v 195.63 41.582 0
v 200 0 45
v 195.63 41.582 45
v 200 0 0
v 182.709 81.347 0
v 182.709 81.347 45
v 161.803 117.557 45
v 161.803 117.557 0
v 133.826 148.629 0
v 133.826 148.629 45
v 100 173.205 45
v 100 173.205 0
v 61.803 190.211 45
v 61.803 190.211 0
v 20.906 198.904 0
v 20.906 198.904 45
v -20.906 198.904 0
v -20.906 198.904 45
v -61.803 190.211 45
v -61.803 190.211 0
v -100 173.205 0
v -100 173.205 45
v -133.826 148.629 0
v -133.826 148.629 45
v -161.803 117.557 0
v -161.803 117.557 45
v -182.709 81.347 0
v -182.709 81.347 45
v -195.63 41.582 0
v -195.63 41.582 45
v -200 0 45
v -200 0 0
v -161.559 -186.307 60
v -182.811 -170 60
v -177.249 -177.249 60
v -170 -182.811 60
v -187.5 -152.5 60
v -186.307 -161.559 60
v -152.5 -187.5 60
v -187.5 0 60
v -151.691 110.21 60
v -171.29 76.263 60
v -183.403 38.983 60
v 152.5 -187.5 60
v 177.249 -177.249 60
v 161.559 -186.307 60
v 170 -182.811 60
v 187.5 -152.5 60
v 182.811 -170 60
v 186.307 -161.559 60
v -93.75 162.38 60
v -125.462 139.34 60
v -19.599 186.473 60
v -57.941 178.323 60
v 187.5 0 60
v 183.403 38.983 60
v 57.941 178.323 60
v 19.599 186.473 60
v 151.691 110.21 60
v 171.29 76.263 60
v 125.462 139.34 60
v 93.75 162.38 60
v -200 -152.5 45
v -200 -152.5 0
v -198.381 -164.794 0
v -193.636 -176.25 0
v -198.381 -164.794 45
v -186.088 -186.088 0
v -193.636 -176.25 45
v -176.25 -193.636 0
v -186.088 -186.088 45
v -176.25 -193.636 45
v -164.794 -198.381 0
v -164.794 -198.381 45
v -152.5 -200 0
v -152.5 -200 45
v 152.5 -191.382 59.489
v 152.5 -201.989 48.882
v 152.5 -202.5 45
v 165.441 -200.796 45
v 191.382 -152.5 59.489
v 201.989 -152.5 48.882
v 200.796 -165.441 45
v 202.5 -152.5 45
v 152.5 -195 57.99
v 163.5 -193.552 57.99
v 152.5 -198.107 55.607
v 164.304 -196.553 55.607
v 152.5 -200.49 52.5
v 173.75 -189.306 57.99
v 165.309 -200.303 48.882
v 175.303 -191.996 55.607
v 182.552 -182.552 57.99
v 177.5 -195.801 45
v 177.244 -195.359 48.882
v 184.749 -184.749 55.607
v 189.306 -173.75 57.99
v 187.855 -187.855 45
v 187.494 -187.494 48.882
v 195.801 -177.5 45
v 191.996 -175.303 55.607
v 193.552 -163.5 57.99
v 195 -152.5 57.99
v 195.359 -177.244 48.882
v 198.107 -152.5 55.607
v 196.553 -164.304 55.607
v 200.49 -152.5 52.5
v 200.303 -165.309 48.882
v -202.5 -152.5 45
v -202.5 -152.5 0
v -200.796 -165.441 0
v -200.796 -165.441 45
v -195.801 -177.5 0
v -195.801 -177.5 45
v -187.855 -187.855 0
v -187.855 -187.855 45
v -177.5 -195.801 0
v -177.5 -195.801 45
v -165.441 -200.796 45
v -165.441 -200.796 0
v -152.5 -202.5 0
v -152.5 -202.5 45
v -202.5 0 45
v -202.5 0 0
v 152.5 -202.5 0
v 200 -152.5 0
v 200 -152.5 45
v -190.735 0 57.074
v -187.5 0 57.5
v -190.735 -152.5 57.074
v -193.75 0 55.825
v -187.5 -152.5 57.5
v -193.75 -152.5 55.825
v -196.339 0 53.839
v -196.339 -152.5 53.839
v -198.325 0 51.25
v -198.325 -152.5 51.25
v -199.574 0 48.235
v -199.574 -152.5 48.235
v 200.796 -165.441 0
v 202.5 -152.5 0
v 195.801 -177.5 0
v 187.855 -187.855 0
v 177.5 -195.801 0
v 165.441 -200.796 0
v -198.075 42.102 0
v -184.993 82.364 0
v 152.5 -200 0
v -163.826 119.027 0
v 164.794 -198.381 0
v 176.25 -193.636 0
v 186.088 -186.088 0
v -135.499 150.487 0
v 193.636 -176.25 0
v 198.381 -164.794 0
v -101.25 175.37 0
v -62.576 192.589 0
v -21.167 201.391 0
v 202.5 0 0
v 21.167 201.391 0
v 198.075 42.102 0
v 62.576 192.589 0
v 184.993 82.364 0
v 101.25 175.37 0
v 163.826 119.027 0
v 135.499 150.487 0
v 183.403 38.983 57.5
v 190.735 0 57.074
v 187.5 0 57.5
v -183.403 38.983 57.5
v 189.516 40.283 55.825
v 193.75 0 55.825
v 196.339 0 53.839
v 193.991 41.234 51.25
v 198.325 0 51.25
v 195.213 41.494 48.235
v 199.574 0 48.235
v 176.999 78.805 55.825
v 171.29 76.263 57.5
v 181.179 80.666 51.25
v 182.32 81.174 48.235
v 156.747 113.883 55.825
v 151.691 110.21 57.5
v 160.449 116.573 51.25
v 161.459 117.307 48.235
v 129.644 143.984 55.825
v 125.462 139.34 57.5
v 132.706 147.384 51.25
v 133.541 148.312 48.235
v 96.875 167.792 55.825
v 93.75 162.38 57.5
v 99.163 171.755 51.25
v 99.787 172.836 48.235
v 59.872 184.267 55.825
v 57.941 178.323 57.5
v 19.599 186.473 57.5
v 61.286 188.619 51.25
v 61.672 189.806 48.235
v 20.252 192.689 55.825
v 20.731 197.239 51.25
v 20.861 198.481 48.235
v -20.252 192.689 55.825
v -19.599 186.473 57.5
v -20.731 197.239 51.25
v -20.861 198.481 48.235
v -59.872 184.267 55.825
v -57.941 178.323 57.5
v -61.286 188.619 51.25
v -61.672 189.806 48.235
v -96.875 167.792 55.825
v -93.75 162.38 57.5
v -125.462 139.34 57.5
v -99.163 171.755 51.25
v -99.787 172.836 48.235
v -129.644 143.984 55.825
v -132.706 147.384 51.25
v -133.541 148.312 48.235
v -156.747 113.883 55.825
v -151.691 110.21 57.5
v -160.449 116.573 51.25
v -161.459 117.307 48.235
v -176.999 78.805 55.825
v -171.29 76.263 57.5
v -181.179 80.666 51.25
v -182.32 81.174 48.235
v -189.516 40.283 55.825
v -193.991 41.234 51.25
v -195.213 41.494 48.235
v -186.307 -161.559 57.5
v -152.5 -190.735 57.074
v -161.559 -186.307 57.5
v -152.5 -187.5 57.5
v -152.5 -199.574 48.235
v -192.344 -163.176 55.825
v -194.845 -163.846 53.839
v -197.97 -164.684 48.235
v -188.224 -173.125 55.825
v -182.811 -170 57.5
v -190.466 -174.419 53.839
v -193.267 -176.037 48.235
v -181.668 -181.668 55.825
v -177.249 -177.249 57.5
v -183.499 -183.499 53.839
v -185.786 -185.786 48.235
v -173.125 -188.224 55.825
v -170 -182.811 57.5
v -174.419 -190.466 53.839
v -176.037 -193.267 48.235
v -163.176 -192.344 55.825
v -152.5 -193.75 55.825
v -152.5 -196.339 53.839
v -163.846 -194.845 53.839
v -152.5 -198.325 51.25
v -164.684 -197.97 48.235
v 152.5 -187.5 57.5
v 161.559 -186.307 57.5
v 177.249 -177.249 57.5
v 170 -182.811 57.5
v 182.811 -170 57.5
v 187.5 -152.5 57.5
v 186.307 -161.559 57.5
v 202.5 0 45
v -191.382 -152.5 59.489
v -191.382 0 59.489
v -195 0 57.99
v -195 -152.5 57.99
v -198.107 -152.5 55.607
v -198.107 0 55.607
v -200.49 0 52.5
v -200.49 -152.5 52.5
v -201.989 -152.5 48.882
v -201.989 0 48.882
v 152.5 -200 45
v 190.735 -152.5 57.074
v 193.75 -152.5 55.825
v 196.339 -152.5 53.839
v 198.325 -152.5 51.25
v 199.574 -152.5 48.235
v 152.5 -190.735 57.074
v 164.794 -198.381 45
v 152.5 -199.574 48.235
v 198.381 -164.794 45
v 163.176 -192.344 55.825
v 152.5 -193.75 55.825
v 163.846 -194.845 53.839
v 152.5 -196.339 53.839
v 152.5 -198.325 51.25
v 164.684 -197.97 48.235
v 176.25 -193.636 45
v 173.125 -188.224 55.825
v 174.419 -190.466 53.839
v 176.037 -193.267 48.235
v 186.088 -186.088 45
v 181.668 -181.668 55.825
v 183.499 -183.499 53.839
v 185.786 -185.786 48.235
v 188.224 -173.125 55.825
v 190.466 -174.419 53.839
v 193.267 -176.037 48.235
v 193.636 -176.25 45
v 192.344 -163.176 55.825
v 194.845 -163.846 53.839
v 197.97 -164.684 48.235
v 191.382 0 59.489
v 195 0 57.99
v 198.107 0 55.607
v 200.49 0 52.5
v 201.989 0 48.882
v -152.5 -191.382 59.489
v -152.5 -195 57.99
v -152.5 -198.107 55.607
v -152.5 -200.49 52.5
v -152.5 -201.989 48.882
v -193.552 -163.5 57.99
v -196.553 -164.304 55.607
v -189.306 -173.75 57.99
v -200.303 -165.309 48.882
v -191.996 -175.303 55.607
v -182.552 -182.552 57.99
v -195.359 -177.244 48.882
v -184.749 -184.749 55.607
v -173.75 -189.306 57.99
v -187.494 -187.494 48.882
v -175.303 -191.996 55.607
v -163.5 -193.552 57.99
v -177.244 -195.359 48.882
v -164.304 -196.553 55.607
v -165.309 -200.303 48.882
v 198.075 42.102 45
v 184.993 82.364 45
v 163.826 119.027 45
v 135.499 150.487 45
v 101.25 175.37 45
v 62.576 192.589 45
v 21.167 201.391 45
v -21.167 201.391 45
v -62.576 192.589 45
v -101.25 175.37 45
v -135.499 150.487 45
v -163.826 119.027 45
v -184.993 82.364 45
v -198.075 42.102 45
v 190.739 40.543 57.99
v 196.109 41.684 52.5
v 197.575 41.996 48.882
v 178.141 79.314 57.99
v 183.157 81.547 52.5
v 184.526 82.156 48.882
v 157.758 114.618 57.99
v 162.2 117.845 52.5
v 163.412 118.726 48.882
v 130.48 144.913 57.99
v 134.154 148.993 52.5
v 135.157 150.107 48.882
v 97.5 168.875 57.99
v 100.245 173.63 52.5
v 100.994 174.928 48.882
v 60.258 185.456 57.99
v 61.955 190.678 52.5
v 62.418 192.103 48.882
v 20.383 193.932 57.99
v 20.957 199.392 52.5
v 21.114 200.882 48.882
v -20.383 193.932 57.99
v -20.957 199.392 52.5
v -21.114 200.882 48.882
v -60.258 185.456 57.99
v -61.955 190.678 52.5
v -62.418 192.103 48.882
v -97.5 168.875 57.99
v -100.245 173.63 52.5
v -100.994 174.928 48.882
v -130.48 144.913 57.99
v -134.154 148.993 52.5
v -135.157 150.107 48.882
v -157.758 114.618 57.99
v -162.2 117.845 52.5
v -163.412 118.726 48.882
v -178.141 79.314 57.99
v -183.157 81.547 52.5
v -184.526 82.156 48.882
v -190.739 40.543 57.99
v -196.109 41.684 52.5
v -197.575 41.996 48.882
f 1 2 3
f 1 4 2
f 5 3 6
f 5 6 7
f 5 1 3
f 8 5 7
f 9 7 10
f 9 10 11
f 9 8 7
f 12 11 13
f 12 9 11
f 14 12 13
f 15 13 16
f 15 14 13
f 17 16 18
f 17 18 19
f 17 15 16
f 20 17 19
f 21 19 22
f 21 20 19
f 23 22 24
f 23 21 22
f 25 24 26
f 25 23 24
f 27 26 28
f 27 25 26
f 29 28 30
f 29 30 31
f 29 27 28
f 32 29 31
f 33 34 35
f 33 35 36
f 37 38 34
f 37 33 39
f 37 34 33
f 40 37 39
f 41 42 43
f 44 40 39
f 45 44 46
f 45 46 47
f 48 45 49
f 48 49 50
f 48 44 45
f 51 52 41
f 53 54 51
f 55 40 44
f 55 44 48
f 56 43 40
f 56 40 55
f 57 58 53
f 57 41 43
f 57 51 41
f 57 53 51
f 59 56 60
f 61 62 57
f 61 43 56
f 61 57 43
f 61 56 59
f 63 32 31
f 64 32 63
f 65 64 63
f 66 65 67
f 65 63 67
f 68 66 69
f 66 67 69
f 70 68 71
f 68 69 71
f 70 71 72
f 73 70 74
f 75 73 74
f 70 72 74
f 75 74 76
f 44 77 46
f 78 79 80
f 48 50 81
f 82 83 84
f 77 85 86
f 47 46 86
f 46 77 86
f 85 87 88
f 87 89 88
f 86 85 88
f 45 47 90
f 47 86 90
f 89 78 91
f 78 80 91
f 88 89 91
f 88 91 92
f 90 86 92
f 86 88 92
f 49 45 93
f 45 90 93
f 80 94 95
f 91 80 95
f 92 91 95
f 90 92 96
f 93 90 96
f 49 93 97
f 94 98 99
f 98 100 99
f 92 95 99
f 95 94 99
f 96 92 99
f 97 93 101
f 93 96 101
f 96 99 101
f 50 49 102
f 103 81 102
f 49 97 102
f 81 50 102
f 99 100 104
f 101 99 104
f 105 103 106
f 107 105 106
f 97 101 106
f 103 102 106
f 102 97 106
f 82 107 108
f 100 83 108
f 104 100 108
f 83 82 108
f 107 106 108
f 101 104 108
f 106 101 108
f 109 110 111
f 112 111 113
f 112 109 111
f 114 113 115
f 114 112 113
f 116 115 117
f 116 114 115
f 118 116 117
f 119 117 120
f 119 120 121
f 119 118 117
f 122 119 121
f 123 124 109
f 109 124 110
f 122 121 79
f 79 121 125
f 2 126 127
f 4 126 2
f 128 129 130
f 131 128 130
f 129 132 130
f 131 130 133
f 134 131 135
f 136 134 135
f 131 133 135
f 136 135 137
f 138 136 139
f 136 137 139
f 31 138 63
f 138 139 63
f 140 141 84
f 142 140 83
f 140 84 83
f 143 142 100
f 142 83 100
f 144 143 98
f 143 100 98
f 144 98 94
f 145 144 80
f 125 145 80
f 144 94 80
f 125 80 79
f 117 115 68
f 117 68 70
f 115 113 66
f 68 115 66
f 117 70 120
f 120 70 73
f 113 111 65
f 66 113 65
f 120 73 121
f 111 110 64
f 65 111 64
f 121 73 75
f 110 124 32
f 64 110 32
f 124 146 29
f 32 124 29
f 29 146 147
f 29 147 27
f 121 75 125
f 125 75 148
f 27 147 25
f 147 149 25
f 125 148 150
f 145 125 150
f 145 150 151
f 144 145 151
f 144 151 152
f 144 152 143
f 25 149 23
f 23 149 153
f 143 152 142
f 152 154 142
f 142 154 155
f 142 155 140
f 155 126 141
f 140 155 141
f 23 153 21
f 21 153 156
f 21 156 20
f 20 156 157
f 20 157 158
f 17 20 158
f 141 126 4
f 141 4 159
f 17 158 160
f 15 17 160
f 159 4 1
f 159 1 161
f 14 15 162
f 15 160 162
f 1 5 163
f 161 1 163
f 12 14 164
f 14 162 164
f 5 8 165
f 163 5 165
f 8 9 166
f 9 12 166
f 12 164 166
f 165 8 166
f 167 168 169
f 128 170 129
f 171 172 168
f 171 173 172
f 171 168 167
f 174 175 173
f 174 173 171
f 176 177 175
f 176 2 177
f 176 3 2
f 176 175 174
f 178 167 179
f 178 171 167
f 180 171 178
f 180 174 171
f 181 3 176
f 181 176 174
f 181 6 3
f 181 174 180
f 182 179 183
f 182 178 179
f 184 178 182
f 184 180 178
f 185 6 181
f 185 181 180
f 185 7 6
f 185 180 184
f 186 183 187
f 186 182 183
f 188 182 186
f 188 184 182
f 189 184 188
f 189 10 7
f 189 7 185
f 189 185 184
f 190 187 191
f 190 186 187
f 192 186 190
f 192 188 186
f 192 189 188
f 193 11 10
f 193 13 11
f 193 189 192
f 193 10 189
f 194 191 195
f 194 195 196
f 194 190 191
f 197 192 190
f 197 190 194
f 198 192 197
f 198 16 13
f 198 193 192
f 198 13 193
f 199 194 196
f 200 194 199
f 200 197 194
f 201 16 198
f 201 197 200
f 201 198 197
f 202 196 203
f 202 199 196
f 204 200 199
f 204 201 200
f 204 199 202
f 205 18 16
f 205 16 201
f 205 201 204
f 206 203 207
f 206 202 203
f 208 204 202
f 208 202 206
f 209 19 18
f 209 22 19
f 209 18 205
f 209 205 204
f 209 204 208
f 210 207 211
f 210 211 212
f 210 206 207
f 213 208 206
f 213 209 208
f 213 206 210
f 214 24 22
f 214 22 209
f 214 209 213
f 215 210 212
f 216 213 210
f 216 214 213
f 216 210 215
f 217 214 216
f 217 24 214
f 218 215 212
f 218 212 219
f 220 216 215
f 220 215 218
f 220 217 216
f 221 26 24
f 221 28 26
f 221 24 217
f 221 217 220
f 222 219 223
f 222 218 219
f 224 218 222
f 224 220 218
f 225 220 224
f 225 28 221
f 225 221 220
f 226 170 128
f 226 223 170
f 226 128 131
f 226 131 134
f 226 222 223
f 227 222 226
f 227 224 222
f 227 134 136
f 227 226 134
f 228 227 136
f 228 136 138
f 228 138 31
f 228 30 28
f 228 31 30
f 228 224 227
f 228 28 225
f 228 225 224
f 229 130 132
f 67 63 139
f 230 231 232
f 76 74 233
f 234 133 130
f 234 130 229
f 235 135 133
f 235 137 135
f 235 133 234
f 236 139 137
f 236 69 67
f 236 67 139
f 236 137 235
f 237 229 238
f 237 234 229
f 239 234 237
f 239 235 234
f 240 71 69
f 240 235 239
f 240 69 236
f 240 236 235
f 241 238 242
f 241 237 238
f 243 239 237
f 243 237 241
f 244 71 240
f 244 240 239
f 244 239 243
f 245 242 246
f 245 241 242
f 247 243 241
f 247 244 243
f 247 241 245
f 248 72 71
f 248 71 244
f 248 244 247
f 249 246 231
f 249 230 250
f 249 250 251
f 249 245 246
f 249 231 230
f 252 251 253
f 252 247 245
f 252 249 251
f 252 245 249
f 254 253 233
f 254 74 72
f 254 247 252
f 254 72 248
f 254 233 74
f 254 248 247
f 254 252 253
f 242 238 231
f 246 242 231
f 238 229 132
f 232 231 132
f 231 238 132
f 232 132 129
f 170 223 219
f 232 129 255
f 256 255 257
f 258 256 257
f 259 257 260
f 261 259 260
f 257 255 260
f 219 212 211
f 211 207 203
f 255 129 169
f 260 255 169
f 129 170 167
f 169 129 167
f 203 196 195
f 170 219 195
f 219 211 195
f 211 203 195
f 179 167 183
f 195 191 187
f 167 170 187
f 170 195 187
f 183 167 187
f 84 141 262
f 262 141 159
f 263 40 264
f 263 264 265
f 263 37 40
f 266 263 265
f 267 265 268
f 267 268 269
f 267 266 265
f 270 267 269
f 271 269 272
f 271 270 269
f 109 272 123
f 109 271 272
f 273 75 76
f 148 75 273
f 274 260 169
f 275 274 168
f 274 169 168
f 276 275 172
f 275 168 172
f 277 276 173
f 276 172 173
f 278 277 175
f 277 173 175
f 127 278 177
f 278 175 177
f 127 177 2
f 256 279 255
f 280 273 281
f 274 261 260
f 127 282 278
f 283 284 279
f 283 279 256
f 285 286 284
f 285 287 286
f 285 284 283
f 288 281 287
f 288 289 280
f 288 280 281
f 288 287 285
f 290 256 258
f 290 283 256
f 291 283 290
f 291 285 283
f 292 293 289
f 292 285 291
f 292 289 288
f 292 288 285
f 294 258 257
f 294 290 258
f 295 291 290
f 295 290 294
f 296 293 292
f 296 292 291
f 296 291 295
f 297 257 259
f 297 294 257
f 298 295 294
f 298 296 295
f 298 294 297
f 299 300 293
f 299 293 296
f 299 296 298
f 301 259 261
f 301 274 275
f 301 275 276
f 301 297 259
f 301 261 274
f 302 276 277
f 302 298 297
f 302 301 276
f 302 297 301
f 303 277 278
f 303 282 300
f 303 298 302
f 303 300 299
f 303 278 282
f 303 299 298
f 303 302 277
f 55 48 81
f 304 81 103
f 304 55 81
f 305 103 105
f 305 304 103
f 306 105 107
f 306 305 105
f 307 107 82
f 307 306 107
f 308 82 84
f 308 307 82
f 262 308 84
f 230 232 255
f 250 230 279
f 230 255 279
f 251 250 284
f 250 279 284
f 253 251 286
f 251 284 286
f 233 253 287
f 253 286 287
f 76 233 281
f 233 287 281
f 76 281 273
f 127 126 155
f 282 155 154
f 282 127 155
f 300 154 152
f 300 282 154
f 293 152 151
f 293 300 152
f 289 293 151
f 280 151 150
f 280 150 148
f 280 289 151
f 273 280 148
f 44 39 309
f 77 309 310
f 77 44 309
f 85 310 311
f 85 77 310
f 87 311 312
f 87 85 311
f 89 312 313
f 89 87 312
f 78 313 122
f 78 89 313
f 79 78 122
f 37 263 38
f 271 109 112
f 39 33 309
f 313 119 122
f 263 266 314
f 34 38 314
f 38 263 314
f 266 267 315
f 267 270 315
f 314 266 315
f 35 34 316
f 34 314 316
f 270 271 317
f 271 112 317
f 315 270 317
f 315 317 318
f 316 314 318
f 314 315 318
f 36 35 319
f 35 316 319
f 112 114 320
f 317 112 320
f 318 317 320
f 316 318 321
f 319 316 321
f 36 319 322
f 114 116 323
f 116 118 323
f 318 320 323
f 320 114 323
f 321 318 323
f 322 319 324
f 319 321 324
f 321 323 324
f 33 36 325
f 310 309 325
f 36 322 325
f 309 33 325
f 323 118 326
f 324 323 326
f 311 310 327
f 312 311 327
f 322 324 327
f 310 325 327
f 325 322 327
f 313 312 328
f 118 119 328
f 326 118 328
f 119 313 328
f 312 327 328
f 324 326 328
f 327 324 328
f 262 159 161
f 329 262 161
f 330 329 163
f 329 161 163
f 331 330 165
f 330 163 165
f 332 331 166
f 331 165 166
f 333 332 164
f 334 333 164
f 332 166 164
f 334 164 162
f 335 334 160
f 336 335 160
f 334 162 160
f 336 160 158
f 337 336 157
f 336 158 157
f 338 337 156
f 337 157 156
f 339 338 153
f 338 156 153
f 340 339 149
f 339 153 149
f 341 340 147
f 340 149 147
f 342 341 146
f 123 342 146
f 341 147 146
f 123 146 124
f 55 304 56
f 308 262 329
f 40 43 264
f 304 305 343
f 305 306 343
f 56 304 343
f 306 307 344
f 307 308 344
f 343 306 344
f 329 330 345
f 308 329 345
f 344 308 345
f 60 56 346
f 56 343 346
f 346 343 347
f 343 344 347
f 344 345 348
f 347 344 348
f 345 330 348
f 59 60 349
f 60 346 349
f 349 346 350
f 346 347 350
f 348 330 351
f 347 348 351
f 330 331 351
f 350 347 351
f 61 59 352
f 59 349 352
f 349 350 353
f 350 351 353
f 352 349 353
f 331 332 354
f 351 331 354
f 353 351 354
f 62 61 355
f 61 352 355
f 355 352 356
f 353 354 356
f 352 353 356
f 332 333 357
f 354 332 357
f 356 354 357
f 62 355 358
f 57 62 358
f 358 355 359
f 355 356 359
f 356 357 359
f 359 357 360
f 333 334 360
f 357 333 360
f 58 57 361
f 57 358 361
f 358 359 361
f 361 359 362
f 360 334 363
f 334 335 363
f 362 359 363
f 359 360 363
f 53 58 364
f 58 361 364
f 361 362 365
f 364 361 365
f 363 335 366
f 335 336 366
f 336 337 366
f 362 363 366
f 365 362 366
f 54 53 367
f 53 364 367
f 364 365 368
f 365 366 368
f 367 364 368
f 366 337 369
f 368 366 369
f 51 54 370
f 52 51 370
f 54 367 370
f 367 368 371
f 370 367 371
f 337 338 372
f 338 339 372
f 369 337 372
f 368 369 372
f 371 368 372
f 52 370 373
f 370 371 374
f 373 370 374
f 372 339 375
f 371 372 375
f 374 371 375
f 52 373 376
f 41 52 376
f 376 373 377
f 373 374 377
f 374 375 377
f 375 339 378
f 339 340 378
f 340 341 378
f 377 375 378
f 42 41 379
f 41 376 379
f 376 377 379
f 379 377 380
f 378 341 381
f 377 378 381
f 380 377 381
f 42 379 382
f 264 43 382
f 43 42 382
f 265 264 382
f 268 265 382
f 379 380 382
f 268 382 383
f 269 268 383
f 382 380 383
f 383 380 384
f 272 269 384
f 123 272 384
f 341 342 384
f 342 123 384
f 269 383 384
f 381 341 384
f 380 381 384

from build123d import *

# Parameters (mm, degrees)
F1_DEPTH = 60
F2_R     = 50
F3_R     = 15
F4_T     = -2.5


with BuildPart() as f1:
    # F0 (on Top) → F1 (new body)
    with BuildSketch(Plane.XY):
        with BuildLine():
            Line((202.5, -202.5), (202.5, 0))
            ThreePointArc((202.5, 0), (0, 202.5), (-202.5, 0))
            Line((-202.5, 0), (-202.5, -202.5))
            Line((-202.5, -202.5), (202.5, -202.5))
        make_face()
    extrude(amount=F1_DEPTH)

    # F2
    f2_edges = [f1.edges().sort_by_distance(p)[0] for p in [
        (202.5, -202.5, 30),
        (-202.5, -202.5, 30),
    ]]
    fillet(f2_edges, radius=F2_R)

    # F3
    f3_edges = [f1.edges().sort_by_distance(p)[0] for p in [
        (-202.5, -76.25, 60),
        (-187.855339, -187.855339, 60),
        (0, 202.5, 60),
        (0, -202.5, 60),
        (202.5, -76.25, 60),
        (187.855339, -187.855339, 60),
    ]]
    fillet(f3_edges, radius=F3_R)

    # F4
    f4_openings = [f1.faces().sort_by_distance(p)[0] for p in [
        (0, -17.630456, 0),
    ]]
    offset(amount=F4_T, openings=f4_openings)


solid = f1.part
